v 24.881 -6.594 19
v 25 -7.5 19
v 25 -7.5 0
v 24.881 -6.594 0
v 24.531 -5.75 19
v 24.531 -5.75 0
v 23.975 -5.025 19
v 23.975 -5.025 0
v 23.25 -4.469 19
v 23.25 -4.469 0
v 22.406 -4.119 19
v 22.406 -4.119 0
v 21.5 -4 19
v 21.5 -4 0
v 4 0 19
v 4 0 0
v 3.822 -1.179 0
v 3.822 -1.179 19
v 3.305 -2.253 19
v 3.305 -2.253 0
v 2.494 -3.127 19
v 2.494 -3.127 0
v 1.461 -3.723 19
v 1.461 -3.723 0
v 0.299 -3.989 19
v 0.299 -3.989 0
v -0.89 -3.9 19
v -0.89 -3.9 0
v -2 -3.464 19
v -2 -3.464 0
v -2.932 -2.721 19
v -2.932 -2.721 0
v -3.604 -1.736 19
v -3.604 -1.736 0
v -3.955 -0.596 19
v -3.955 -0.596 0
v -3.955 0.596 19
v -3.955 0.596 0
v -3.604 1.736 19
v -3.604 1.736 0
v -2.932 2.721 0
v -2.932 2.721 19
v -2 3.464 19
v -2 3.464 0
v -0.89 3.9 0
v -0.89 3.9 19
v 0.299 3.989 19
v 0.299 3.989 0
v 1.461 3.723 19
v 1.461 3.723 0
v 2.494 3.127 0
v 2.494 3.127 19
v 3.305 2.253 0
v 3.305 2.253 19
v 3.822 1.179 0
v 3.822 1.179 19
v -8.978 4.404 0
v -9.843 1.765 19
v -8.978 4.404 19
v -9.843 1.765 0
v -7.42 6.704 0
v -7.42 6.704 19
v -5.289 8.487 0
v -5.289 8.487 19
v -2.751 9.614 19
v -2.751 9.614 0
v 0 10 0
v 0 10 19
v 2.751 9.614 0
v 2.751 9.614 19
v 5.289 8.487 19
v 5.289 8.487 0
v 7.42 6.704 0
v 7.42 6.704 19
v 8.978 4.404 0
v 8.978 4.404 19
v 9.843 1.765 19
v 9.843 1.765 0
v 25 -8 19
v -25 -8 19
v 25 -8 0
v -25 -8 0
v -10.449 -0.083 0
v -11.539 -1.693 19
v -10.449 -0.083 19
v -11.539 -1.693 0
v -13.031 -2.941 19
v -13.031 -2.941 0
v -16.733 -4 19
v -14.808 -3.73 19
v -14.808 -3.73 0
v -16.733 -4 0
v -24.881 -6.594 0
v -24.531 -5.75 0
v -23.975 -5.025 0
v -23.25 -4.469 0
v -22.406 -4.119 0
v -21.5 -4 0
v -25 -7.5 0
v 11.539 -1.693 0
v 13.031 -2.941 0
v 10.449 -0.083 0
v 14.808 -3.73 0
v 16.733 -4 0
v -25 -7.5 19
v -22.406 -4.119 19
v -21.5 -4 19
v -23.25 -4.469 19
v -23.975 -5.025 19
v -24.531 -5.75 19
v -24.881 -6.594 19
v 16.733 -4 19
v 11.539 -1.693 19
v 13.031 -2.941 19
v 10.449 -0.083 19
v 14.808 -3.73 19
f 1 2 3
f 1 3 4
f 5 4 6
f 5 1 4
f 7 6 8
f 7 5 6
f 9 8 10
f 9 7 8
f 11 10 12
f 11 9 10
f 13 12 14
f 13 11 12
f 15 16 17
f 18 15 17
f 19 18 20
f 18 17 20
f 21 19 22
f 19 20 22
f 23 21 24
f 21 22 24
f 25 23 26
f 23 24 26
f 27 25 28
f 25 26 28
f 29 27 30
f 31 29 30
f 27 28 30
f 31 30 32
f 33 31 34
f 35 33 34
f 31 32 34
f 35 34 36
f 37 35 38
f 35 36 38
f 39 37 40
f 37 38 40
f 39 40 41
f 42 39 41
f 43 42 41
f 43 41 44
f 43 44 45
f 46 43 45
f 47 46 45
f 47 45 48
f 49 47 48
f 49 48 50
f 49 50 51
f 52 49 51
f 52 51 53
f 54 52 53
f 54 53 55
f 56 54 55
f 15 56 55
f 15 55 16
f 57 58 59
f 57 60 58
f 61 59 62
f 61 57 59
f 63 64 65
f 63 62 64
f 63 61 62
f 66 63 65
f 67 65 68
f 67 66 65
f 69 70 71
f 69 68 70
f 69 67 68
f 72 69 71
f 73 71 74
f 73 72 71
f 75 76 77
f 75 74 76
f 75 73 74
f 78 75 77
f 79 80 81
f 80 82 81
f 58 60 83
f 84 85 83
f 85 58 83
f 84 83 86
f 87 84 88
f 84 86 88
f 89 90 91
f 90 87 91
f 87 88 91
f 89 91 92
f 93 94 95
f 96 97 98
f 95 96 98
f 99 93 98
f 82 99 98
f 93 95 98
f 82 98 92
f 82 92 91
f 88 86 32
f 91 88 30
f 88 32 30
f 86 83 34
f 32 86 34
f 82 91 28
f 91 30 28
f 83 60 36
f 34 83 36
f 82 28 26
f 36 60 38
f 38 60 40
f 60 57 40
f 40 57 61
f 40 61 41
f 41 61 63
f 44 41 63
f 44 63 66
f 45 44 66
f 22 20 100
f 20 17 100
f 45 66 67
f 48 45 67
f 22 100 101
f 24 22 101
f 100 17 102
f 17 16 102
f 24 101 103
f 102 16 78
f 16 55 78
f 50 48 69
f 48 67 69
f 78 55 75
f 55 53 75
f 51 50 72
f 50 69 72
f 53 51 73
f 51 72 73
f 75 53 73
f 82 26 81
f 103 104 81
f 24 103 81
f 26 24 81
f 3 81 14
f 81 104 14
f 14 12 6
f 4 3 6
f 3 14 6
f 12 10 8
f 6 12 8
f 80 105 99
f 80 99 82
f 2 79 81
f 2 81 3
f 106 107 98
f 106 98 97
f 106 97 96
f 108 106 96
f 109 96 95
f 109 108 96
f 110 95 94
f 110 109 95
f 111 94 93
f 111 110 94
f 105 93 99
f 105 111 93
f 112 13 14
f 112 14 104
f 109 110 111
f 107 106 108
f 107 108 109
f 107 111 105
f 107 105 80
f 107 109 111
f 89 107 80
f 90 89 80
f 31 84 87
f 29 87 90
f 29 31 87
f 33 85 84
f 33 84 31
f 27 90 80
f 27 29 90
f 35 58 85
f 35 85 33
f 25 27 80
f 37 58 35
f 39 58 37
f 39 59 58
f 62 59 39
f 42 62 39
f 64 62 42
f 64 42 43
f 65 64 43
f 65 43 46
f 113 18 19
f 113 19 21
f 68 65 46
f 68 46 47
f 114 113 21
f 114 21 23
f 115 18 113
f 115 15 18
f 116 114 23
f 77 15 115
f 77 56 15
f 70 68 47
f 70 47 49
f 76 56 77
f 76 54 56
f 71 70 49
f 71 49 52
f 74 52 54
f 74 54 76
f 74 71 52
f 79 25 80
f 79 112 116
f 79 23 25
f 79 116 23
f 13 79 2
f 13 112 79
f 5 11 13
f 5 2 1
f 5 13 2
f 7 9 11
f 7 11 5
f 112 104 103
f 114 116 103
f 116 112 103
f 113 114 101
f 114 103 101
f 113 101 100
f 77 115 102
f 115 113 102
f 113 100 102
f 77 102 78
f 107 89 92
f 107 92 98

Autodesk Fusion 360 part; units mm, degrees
sketch "Sketch1" plane through (0, 0, 0) normal (0, 0, 1) x (1, 0, 0)
  circle A0 centre (0, 0) radius 4
  circle A1 centre (0, 0) radius 10
  line L0 (-25, -8) -> (25, -8)
  line L1 (25, -8) -> (25, -4)
  line L2 (25, -4) -> (-25, -4)
  line L3 (-25, -4) -> (-25, -8)
  line L4 (-25, -8) -> (25, -4) construction
  line L5 (25, -8) -> (-25, -4) construction
  circle A2 centre (-16.7332, 3) radius 7
  circle A3 centre (16.7332, 3) radius 7
  dimension "d1" = 8
  dimension "d2" = 20
  dimension "d3" = 50
  dimension "d4" = 4
  dimension "d5" = 14
  dimension "d6" = 14
extrude "Extrude1" add sketch "Sketch1" along normal blind 19 contours A1 L2 | A1 L0 L2 | A1 L0 L1 L2 | A1 L2 A3 | A1 L2 A2 | A1 L0 L2 L3
fillet "Fillet1" radius 3.5 2 edges at (25, -4, 9.5) (-25, -4, 9.5)
